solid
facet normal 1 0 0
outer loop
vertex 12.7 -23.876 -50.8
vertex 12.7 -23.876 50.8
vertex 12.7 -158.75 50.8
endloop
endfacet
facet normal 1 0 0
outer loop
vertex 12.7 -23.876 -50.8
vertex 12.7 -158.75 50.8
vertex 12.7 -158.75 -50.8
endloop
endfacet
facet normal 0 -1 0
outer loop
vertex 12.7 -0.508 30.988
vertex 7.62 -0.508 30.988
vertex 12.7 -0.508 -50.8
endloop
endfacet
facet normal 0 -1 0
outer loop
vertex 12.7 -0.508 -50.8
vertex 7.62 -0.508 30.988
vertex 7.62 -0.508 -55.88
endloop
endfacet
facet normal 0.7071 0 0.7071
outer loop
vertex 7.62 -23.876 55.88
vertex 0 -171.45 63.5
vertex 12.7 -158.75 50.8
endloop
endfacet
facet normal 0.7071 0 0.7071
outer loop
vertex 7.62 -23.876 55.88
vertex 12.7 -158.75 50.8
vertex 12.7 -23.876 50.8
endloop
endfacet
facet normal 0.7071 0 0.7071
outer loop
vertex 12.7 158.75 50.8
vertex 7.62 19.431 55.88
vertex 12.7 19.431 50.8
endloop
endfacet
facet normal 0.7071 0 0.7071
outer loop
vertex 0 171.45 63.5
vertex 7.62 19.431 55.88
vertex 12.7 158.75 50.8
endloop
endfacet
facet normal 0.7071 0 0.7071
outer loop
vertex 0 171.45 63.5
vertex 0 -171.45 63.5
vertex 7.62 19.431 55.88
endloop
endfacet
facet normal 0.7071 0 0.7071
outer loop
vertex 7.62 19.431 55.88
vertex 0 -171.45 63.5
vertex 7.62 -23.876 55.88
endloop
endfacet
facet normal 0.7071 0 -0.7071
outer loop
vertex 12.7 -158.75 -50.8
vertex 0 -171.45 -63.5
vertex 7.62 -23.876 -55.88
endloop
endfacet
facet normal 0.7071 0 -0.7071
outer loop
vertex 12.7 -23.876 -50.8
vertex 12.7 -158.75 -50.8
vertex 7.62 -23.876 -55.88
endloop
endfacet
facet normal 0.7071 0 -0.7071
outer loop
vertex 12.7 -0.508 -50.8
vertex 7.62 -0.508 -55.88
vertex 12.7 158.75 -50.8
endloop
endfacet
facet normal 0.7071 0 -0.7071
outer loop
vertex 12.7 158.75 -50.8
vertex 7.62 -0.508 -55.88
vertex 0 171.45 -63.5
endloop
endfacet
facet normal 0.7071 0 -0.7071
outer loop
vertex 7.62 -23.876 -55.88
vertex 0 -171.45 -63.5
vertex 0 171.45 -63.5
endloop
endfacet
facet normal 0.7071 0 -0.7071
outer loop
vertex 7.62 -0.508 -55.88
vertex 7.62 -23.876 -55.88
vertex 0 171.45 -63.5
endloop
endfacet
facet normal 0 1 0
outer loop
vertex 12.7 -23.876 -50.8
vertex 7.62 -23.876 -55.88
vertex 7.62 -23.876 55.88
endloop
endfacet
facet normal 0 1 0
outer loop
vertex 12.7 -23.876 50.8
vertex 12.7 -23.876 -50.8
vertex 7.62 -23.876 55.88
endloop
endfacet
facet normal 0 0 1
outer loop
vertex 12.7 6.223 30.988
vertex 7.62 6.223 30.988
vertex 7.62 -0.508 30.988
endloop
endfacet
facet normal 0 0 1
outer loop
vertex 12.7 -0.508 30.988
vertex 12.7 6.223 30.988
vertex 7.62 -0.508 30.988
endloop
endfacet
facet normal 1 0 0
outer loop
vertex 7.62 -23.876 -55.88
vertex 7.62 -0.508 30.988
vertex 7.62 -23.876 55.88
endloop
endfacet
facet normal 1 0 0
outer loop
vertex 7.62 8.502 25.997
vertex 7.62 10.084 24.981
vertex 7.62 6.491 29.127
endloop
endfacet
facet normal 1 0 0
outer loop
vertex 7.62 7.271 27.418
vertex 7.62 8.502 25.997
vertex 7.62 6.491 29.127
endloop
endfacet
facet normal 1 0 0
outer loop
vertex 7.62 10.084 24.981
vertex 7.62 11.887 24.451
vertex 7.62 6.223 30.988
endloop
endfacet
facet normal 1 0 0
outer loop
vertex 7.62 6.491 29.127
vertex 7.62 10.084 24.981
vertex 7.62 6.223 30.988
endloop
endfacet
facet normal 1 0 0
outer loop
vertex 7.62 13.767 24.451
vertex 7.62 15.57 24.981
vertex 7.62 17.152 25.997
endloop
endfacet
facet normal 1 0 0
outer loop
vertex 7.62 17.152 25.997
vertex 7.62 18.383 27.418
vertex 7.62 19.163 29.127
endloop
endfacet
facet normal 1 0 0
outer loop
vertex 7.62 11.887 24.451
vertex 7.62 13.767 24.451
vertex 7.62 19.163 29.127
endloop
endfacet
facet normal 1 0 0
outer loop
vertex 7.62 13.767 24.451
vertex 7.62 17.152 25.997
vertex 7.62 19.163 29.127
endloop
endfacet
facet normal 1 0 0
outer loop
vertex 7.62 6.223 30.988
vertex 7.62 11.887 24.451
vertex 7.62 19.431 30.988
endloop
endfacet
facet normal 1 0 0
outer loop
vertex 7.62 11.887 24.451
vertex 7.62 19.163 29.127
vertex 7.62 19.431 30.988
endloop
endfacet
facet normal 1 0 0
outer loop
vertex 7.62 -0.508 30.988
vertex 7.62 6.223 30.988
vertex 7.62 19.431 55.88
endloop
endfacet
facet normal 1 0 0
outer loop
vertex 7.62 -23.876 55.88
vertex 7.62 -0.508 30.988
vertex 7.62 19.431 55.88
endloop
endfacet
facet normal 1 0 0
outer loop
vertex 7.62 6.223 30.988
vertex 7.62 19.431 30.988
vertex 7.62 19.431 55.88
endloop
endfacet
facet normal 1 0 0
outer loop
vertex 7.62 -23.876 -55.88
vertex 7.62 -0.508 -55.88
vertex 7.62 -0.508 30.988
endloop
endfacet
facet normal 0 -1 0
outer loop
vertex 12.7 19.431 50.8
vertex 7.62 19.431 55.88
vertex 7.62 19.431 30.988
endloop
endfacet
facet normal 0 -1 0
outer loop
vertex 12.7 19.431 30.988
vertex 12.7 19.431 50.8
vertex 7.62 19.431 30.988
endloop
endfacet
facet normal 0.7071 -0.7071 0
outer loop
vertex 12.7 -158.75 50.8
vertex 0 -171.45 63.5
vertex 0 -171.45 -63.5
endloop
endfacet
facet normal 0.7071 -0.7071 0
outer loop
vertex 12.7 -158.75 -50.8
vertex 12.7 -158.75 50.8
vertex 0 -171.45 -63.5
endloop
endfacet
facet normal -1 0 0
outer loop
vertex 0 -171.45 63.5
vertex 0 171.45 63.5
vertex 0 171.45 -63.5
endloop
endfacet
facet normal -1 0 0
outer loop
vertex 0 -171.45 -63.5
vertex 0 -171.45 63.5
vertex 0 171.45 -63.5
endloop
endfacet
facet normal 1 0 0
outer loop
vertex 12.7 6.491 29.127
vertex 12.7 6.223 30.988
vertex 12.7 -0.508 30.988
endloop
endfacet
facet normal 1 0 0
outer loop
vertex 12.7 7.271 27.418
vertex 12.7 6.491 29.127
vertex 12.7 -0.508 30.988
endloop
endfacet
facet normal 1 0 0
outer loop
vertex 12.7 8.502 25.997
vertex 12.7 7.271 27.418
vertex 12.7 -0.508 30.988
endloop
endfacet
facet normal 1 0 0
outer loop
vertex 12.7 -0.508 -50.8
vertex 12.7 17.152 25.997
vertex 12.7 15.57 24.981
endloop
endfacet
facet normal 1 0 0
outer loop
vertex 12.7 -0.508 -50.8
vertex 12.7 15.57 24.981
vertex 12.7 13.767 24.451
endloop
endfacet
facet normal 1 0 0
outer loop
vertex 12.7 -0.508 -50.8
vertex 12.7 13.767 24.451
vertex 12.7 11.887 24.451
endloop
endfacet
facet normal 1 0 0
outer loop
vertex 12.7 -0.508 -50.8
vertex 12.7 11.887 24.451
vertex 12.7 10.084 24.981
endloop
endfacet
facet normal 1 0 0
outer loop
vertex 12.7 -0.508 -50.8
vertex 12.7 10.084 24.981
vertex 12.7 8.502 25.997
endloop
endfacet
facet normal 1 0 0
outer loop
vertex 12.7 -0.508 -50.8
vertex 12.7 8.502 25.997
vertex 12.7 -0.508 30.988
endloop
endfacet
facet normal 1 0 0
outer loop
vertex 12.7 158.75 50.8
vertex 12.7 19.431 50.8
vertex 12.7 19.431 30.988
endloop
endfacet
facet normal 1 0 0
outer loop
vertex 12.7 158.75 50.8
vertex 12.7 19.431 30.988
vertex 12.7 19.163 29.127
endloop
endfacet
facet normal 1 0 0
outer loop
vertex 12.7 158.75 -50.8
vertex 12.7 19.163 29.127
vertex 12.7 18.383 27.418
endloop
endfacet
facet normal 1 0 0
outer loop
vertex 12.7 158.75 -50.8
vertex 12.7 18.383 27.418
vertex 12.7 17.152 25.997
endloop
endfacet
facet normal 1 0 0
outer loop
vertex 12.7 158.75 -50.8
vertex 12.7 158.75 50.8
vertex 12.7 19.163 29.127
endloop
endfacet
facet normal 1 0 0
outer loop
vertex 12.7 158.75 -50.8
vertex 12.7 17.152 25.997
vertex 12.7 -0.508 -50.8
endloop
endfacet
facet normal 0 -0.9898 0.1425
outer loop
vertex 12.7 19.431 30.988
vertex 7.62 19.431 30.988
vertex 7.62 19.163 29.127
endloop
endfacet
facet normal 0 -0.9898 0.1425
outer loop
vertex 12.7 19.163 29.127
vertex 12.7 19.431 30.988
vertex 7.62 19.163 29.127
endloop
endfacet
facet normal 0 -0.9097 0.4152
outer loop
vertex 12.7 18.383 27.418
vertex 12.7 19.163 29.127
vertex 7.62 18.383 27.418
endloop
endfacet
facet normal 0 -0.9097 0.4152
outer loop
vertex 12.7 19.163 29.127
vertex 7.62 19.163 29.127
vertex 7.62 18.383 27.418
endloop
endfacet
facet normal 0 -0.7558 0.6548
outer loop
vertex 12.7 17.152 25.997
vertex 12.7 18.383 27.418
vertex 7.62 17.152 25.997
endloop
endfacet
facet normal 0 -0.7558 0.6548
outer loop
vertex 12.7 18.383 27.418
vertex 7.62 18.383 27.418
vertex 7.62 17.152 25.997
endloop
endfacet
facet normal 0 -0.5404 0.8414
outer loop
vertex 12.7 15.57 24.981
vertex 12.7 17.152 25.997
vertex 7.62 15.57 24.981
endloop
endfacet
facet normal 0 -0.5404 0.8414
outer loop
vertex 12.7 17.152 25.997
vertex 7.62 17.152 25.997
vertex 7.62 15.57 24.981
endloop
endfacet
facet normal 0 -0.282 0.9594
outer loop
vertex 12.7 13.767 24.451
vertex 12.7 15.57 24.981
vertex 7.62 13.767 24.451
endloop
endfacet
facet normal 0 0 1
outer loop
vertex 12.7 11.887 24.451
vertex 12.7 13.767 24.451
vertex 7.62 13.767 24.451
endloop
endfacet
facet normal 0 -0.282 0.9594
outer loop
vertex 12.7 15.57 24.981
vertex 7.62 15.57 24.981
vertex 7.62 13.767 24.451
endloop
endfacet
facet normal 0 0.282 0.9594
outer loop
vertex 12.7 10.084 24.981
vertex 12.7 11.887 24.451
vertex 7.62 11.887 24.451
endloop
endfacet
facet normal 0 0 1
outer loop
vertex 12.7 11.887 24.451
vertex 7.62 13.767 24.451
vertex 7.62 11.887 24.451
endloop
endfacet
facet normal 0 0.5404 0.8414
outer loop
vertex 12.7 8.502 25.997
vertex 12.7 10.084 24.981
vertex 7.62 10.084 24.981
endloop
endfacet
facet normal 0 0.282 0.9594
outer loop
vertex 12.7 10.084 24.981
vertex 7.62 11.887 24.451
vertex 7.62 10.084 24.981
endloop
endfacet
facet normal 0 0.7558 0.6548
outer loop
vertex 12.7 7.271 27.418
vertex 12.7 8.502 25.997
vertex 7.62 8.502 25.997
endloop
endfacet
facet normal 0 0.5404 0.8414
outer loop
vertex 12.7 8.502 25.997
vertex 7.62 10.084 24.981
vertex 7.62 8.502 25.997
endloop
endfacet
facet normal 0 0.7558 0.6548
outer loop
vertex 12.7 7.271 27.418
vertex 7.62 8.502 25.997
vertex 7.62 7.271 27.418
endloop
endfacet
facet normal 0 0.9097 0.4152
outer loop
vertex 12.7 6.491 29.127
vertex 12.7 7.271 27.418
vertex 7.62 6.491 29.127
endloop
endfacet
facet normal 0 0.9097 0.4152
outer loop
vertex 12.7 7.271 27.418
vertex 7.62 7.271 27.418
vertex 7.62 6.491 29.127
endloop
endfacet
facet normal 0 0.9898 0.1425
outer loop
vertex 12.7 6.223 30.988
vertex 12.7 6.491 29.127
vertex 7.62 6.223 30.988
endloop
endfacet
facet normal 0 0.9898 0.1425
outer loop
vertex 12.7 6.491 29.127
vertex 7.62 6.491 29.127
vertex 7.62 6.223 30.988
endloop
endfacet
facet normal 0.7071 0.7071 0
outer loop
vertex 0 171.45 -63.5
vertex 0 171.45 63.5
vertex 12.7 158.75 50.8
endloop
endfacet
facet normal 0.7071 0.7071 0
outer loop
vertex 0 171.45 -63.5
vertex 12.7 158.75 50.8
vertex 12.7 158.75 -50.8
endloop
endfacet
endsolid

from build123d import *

# Parameters (mm, degrees)
SKETCH1_W               = 127
SKETCH1_H               = 342.9
BOSS_EXTRUDE1_DEPTH     = 12.7
DRAFT1_ANGLE            = -45
CUT_EXTRUDE1_DEPTH      = 184.272045059
CUT_EXTRUDE1_DEPTH_BACK = 5.08


with BuildPart() as part:
    # Sketch1 → Boss-Extrude1 (new body)
    with BuildSketch(Plane(origin=(0, 0, 0), x_dir=(0, 0, -1), z_dir=(1, 0, 0))):
        Rectangle(SKETCH1_W, SKETCH1_H)
    extrude(amount=BOSS_EXTRUDE1_DEPTH)

    # Draft1
    draft1_faces = [part.faces().sort_by_distance(p)[0] for p in [
        (6.35, -171.45, 0),
        (6.35, 0, -63.5),
        (6.35, 0, 63.5),
        (6.35, 171.45, 0),
    ]]
    draft(draft1_faces, Plane(origin=(0, 0, 0), x_dir=(0, 0, -1), z_dir=(-1, 0, 0)), DRAFT1_ANGLE)

    # Sketch2 → Cut-Extrude1 (cut, two sides: drawn at the far end of the back side and taken through both)
    with BuildSketch(Plane(origin=(12.7, 0, 0), x_dir=(0, 0, -1), z_dir=(1, 0, 0)).offset(-CUT_EXTRUDE1_DEPTH_BACK)):
        with BuildLine():
            Line((-63.5, 19.431), (-30.988, 19.431))
            ThreePointArc((-30.988, 19.431), (-24.384, 12.827), (-30.988, 6.223))
            Line((-30.988, 6.223), (-30.988, -0.508))
            Line((-30.988, -0.508), (63.5, -0.508))
            Line((63.5, -0.508), (63.5, -23.876))
            Line((63.5, -23.876), (-63.5, -23.876))
            Line((-63.5, -23.876), (-63.5, 19.431))
        make_face()
    extrude(amount=CUT_EXTRUDE1_DEPTH + CUT_EXTRUDE1_DEPTH_BACK, mode=Mode.SUBTRACT)


solid = part.part
